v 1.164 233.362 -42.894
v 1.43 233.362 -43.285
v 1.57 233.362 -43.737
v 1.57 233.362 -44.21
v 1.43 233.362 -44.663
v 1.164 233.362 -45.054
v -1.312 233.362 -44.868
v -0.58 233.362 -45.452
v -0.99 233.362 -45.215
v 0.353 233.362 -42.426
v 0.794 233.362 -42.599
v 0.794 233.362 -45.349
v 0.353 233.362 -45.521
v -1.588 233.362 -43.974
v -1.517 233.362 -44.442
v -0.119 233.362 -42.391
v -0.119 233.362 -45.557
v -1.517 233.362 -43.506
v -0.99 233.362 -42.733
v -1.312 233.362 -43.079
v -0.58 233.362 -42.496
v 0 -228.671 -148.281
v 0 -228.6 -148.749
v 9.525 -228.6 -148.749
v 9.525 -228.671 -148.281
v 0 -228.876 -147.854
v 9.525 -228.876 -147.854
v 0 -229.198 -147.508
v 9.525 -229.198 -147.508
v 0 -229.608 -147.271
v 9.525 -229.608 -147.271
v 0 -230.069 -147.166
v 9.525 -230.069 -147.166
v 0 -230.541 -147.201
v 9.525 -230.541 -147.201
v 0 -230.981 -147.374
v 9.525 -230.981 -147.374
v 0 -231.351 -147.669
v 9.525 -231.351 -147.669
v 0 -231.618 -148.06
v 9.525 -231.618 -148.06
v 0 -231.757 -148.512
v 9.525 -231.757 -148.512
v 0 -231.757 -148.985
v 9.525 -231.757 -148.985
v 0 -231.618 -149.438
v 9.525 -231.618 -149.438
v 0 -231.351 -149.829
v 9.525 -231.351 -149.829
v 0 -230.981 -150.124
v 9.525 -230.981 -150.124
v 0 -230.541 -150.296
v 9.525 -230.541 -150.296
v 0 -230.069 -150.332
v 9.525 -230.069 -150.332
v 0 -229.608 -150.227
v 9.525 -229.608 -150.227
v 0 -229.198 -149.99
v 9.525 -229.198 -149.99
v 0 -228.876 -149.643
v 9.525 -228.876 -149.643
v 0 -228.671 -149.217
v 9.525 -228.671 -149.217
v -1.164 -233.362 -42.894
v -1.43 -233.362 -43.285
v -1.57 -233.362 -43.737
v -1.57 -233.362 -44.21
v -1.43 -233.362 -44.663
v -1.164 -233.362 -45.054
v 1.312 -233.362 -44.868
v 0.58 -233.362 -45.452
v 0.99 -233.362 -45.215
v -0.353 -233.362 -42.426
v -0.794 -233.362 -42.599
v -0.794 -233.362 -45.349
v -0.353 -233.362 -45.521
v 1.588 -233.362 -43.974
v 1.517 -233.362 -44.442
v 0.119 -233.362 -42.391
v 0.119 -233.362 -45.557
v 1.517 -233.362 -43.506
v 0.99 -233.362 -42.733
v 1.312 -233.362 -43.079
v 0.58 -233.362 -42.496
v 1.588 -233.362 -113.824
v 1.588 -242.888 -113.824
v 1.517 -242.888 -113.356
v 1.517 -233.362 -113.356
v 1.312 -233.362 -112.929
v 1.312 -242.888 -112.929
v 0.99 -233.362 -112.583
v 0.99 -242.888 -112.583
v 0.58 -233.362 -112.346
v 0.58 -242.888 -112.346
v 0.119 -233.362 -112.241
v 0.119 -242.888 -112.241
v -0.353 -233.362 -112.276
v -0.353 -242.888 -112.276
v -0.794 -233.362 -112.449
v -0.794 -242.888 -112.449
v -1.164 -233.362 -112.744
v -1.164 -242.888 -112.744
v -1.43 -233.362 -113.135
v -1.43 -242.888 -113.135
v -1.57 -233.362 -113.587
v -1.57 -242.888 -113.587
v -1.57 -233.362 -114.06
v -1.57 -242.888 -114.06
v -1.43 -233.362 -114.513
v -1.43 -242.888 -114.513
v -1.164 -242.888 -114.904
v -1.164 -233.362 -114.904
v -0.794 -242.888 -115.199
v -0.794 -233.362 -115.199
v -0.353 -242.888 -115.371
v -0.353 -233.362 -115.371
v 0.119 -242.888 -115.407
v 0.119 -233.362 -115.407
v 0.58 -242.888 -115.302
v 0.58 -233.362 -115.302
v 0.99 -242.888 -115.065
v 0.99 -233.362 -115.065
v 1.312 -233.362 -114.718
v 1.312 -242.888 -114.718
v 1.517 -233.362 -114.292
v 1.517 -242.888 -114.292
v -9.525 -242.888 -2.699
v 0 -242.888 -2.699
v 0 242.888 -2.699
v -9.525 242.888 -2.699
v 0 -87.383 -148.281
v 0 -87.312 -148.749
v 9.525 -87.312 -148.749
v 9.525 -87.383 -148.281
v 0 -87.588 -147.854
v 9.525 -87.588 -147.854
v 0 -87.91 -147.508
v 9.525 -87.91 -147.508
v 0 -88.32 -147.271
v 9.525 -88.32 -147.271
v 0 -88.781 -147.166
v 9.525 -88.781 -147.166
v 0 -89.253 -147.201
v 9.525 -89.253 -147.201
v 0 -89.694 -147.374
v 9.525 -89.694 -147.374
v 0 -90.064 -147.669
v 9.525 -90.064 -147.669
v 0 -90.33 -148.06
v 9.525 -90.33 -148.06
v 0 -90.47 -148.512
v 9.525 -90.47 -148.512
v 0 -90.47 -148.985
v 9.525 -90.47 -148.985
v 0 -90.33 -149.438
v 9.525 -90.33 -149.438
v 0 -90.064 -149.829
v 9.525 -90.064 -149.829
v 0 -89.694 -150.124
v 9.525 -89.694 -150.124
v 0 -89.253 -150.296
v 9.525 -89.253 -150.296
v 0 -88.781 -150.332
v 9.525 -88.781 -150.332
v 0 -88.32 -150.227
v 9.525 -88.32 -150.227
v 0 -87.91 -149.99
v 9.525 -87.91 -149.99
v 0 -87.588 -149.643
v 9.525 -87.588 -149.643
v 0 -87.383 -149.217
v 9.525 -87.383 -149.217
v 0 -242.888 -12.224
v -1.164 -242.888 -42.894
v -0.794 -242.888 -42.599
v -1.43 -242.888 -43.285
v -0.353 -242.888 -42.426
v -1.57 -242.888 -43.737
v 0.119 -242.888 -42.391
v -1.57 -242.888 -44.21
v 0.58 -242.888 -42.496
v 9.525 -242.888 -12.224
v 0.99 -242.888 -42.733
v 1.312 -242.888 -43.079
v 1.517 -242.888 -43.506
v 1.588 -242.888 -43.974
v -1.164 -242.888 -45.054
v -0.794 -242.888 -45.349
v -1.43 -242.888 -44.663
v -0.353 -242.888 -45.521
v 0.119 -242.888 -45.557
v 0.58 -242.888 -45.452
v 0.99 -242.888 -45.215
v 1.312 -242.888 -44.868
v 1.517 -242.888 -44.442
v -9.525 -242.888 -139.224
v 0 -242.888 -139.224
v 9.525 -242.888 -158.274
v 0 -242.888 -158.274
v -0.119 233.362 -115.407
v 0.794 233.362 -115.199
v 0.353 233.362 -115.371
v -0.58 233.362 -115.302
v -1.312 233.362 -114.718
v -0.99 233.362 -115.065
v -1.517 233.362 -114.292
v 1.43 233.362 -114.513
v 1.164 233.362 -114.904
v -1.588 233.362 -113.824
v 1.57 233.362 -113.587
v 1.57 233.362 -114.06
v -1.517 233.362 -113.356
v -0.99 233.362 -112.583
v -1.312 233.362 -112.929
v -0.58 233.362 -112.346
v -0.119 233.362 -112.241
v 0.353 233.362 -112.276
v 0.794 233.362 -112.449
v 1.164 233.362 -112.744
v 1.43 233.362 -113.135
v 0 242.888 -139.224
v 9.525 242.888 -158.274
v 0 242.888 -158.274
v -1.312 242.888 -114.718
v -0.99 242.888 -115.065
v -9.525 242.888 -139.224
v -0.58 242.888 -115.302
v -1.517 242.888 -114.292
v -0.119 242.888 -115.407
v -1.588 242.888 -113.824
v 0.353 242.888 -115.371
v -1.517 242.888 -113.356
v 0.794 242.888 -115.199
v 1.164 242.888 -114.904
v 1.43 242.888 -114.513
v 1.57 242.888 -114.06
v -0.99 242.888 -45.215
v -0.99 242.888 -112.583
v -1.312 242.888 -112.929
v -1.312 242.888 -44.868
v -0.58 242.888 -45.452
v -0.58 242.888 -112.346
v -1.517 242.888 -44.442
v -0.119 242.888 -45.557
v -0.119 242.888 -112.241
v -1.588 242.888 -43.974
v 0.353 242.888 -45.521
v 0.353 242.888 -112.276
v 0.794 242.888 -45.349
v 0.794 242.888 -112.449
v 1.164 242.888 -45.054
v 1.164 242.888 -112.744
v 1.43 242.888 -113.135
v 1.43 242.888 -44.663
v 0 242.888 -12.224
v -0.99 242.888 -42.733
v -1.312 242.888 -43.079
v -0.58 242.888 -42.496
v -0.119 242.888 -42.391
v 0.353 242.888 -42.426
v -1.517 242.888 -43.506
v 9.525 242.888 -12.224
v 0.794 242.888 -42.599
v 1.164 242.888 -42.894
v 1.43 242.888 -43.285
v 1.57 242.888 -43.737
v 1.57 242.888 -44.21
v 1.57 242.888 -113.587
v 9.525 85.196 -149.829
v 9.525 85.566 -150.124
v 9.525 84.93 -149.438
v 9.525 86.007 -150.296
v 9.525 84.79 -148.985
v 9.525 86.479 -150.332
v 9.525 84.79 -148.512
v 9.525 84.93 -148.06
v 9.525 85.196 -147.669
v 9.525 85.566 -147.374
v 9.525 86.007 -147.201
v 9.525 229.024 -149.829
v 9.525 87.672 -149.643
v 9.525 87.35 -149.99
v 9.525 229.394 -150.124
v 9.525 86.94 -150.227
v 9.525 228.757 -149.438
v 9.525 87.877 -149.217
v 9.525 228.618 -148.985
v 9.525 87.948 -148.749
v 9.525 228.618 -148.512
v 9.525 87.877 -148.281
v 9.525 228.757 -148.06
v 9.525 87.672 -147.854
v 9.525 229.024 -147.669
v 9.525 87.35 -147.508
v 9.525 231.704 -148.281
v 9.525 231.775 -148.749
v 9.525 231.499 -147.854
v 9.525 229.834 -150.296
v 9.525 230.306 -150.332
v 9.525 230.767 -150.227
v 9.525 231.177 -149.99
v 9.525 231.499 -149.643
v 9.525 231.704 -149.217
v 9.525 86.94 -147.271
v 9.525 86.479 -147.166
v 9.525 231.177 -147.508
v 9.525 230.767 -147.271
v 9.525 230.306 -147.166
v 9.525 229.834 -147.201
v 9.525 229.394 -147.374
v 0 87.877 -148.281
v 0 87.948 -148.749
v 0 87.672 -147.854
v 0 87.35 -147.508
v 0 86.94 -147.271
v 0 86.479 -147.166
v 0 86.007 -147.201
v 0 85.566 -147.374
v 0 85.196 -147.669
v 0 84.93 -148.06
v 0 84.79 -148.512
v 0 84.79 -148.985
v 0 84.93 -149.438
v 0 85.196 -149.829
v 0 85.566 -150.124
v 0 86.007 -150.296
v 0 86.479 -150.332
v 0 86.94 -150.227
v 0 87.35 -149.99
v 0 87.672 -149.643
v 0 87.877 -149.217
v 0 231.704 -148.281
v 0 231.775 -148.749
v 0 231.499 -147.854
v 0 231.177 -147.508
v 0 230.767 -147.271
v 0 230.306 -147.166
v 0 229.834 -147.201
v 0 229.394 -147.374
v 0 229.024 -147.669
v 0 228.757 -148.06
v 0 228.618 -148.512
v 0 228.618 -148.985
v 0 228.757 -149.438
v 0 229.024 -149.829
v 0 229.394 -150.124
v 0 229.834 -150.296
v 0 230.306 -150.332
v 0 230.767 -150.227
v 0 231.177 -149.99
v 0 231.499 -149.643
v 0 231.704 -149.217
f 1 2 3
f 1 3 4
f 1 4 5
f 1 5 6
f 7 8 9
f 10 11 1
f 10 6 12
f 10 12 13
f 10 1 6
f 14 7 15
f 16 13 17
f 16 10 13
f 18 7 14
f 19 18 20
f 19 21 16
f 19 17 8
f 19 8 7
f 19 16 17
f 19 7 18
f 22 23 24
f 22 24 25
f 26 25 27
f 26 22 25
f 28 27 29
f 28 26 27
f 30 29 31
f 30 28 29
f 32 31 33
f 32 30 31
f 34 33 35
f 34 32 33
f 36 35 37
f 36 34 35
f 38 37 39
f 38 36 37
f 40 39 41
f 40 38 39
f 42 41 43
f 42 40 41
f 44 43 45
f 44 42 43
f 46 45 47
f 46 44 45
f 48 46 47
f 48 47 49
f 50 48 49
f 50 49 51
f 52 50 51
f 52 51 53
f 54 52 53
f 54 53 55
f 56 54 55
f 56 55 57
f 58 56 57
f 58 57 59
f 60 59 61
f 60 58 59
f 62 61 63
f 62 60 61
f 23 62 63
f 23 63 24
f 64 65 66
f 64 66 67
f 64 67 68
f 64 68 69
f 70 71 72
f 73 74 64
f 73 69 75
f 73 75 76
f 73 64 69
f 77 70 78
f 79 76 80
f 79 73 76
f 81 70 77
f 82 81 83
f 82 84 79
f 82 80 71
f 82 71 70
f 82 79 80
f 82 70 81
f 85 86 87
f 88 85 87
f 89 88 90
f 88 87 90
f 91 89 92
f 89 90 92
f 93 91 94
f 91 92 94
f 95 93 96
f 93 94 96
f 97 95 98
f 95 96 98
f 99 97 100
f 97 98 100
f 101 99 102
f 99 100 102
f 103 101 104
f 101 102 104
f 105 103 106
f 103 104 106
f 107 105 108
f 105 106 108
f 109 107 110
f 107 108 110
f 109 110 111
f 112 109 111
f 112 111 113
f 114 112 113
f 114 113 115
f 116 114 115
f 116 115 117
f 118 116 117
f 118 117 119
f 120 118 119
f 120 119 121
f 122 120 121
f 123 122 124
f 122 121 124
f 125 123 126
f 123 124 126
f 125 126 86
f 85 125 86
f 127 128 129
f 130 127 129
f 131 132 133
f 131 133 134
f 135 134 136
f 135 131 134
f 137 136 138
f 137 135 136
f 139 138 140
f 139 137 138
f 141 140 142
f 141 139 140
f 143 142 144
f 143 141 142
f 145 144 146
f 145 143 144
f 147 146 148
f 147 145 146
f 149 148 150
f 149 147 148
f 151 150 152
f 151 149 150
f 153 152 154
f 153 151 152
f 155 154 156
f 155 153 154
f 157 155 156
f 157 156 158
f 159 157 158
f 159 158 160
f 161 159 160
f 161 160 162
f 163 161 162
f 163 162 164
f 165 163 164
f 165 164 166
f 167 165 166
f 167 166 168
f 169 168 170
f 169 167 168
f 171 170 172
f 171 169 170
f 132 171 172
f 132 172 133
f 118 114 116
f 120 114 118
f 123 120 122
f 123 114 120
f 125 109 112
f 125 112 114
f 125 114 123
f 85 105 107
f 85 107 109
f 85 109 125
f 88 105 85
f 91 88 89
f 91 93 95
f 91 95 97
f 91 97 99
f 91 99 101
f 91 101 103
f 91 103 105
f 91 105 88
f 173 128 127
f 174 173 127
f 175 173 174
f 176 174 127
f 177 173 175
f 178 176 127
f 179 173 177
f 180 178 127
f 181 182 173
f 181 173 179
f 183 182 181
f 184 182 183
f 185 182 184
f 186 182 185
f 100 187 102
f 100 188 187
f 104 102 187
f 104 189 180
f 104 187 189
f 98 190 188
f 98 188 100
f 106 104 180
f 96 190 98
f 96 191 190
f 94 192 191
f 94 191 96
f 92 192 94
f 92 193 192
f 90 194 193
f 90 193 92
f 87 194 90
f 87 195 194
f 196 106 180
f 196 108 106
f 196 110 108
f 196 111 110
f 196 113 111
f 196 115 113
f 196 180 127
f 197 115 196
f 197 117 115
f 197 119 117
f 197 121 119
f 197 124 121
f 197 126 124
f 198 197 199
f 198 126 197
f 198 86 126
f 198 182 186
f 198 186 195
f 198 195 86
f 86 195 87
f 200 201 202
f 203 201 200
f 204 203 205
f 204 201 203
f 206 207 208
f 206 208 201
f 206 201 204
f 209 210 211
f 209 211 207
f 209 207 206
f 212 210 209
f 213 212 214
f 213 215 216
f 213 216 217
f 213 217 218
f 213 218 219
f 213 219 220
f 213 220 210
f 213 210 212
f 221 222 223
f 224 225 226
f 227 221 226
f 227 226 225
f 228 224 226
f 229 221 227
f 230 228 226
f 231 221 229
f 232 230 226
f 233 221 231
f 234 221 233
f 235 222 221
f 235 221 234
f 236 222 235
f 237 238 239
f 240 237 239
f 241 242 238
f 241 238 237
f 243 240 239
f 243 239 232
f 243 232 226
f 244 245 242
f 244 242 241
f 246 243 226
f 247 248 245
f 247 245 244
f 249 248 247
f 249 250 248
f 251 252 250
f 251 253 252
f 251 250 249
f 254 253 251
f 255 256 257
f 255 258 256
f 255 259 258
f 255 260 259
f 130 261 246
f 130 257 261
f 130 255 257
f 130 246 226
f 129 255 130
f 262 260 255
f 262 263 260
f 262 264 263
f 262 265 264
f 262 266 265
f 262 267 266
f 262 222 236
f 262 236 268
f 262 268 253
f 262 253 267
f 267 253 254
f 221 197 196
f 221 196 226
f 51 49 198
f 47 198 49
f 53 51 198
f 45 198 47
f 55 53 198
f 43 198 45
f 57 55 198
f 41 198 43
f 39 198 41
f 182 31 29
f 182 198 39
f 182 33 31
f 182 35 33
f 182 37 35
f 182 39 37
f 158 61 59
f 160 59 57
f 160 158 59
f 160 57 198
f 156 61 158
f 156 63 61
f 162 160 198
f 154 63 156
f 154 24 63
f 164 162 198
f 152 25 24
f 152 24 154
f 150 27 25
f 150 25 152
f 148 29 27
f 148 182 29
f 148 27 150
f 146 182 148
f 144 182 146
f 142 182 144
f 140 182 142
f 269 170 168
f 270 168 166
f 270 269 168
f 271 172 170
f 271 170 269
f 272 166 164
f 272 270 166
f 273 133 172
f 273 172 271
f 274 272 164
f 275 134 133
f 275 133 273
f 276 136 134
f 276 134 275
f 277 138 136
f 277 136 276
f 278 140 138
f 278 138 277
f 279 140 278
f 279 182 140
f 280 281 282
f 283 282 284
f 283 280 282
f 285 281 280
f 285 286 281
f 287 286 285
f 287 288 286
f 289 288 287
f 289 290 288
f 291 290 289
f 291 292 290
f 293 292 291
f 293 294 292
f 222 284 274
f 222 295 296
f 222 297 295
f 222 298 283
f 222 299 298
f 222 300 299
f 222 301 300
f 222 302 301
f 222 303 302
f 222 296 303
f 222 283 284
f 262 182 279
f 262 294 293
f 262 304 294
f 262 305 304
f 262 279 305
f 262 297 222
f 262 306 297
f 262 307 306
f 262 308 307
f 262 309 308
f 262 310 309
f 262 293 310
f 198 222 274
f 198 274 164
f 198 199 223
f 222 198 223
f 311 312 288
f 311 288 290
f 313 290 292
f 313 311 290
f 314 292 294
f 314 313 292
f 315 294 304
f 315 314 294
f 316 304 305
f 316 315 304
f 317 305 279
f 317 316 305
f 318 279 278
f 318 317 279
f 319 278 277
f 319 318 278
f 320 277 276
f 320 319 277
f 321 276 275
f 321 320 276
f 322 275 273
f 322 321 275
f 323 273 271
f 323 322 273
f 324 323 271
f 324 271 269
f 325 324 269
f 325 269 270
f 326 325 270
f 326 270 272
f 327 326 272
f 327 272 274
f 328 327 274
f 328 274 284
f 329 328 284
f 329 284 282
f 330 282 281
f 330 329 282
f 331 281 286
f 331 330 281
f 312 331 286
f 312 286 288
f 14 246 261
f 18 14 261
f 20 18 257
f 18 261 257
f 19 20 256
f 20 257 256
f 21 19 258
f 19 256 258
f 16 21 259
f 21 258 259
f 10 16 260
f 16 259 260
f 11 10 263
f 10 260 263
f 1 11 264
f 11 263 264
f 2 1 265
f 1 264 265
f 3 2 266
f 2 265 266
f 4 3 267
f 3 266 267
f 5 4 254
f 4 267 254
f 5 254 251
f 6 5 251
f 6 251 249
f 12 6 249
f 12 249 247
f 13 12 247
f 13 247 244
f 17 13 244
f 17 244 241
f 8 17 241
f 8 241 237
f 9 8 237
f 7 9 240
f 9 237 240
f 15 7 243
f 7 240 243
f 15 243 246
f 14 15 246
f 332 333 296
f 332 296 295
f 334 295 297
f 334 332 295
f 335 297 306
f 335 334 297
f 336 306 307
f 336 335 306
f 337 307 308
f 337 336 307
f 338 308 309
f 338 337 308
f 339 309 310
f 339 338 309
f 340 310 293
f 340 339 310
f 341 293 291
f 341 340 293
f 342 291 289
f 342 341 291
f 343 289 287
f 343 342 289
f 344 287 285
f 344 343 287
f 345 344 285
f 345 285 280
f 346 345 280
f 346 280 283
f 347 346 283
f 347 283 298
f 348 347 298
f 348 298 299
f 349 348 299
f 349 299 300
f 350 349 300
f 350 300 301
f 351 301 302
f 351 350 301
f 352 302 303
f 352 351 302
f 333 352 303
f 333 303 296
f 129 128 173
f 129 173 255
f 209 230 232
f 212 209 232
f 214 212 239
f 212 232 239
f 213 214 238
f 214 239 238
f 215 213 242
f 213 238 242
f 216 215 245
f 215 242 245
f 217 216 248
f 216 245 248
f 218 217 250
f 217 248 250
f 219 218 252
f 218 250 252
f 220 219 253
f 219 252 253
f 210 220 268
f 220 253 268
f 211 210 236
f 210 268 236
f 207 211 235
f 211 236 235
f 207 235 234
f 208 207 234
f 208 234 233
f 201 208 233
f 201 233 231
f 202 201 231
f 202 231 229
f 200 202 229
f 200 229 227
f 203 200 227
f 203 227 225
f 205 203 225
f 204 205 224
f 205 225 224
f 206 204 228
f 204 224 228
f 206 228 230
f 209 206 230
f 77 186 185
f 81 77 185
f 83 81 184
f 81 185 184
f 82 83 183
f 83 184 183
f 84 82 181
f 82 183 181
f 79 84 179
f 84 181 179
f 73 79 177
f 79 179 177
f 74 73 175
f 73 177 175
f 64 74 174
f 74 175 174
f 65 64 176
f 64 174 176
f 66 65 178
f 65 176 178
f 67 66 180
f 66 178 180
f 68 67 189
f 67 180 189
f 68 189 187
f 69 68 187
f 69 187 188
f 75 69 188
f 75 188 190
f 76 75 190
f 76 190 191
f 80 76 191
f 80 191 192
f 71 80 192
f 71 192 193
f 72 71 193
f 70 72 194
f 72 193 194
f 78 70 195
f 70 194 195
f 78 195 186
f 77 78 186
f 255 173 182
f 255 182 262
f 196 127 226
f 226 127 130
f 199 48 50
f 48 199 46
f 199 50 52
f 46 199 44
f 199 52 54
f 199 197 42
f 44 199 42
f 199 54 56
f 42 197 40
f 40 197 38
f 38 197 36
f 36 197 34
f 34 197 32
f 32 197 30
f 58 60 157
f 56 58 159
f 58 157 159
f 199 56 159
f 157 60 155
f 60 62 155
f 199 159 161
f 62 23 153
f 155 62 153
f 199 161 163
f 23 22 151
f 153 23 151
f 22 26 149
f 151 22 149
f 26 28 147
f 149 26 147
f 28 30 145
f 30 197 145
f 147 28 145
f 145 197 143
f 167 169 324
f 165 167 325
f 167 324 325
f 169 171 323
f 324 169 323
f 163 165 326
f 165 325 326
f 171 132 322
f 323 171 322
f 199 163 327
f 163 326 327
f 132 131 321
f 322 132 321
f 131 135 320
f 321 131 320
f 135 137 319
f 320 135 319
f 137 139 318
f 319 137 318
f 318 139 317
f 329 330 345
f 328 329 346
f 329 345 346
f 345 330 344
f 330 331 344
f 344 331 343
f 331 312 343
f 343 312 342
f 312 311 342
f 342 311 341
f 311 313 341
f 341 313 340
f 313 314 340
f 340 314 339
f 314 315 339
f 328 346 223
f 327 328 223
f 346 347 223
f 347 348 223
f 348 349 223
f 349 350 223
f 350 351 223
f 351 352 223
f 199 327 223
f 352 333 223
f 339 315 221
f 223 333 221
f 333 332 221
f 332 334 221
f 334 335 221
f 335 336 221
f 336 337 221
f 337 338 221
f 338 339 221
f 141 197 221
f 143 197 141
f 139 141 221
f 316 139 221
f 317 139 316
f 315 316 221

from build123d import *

# Parameters (mm, degrees)
F0_W     = 485.775
F0_H     = 19.05
F0_R     = 1.5875
F0_H_2   = 127
F1_DEPTH = 9.525
F0_H_3   = 9.525
F2_DEPTH = 9.525
F4_R     = 1.5875
F5_DEPTH = 9.525
F3_R     = 1.5875
F6_DEPTH = 9.525


with BuildPart() as f1:
    # F0 (on Right) → F1 (new body)
    with BuildSketch(Plane.YZ):
        with Locations((0, -148.74875)):
            Rectangle(F0_W, F0_H)
        with Locations((-230.1875, -148.74875)):
            Circle(F0_R, mode=Mode.SUBTRACT)
        with Locations((-88.9, -148.74875)):
            Circle(F0_R, mode=Mode.SUBTRACT)
        with Locations((86.36, -148.74875)):
            Circle(F0_R, mode=Mode.SUBTRACT)
        with Locations((230.1875, -148.74875)):
            Circle(F0_R, mode=Mode.SUBTRACT)
        with Locations((0, -75.72375)):
            Rectangle(F0_W, F0_H_2)
        with BuildLine():
            Line((-50.8, -101.12375), (50.8, -101.12375))
            ThreePointArc((50.8, -101.12375), (57.15, -107.47375), (50.8, -113.82375))
            Line((50.8, -113.82375), (-50.8, -113.82375))
            ThreePointArc((-50.8, -113.82375), (-57.15, -107.47375), (-50.8, -101.12375))
        make_face(mode=Mode.SUBTRACT)
        with BuildLine():
            ThreePointArc((50.8, -113.82375), (57.15, -107.47375), (50.8, -101.12375))
            Line((50.8, -101.12375), (-50.8, -101.12375))
            ThreePointArc((-50.8, -101.12375), (-57.15, -107.47375), (-50.8, -113.82375))
            Line((-50.8, -113.82375), (50.8, -113.82375))
        make_face()
    extrude(amount=F1_DEPTH)

    # F0 (on Right) → F2 (join)
    with BuildSketch(Plane.YZ):
        with Locations((0, -75.72375)):
            Rectangle(F0_W, F0_H_2)
        with BuildLine():
            Line((-50.8, -101.12375), (50.8, -101.12375))
            ThreePointArc((50.8, -101.12375), (57.15, -107.47375), (50.8, -113.82375))
            Line((50.8, -113.82375), (-50.8, -113.82375))
            ThreePointArc((-50.8, -113.82375), (-57.15, -107.47375), (-50.8, -101.12375))
        make_face(mode=Mode.SUBTRACT)
        with Locations((0, -7.46125)):
            Rectangle(F0_W, F0_H_3)
        with BuildLine():
            ThreePointArc((50.8, -113.82375), (57.15, -107.47375), (50.8, -101.12375))
            Line((50.8, -101.12375), (-50.8, -101.12375))
            ThreePointArc((-50.8, -101.12375), (-57.15, -107.47375), (-50.8, -113.82375))
            Line((-50.8, -113.82375), (50.8, -113.82375))
        make_face()
    extrude(amount=-F2_DEPTH)

    # F4 (on face) → F5 (cut)
    with BuildSketch(Plane(origin=(0, 242.8875, 0), x_dir=(-1, 0, 0), z_dir=(0, 1, 0))):
        with Locations((0, -43.97375)):
            Circle(F4_R)
        with Locations((0, -113.82375)):
            Circle(F4_R)
    extrude(amount=-F5_DEPTH, mode=Mode.SUBTRACT)

    # F3 (on face) → F6 (cut)
    with BuildSketch(Plane.XZ.offset(242.8875)):
        with Locations((0, -113.82375)):
            Circle(F3_R)
        with Locations((0, -43.97375)):
            Circle(F3_R)
    extrude(amount=-F6_DEPTH, mode=Mode.SUBTRACT)


solid = f1.part
